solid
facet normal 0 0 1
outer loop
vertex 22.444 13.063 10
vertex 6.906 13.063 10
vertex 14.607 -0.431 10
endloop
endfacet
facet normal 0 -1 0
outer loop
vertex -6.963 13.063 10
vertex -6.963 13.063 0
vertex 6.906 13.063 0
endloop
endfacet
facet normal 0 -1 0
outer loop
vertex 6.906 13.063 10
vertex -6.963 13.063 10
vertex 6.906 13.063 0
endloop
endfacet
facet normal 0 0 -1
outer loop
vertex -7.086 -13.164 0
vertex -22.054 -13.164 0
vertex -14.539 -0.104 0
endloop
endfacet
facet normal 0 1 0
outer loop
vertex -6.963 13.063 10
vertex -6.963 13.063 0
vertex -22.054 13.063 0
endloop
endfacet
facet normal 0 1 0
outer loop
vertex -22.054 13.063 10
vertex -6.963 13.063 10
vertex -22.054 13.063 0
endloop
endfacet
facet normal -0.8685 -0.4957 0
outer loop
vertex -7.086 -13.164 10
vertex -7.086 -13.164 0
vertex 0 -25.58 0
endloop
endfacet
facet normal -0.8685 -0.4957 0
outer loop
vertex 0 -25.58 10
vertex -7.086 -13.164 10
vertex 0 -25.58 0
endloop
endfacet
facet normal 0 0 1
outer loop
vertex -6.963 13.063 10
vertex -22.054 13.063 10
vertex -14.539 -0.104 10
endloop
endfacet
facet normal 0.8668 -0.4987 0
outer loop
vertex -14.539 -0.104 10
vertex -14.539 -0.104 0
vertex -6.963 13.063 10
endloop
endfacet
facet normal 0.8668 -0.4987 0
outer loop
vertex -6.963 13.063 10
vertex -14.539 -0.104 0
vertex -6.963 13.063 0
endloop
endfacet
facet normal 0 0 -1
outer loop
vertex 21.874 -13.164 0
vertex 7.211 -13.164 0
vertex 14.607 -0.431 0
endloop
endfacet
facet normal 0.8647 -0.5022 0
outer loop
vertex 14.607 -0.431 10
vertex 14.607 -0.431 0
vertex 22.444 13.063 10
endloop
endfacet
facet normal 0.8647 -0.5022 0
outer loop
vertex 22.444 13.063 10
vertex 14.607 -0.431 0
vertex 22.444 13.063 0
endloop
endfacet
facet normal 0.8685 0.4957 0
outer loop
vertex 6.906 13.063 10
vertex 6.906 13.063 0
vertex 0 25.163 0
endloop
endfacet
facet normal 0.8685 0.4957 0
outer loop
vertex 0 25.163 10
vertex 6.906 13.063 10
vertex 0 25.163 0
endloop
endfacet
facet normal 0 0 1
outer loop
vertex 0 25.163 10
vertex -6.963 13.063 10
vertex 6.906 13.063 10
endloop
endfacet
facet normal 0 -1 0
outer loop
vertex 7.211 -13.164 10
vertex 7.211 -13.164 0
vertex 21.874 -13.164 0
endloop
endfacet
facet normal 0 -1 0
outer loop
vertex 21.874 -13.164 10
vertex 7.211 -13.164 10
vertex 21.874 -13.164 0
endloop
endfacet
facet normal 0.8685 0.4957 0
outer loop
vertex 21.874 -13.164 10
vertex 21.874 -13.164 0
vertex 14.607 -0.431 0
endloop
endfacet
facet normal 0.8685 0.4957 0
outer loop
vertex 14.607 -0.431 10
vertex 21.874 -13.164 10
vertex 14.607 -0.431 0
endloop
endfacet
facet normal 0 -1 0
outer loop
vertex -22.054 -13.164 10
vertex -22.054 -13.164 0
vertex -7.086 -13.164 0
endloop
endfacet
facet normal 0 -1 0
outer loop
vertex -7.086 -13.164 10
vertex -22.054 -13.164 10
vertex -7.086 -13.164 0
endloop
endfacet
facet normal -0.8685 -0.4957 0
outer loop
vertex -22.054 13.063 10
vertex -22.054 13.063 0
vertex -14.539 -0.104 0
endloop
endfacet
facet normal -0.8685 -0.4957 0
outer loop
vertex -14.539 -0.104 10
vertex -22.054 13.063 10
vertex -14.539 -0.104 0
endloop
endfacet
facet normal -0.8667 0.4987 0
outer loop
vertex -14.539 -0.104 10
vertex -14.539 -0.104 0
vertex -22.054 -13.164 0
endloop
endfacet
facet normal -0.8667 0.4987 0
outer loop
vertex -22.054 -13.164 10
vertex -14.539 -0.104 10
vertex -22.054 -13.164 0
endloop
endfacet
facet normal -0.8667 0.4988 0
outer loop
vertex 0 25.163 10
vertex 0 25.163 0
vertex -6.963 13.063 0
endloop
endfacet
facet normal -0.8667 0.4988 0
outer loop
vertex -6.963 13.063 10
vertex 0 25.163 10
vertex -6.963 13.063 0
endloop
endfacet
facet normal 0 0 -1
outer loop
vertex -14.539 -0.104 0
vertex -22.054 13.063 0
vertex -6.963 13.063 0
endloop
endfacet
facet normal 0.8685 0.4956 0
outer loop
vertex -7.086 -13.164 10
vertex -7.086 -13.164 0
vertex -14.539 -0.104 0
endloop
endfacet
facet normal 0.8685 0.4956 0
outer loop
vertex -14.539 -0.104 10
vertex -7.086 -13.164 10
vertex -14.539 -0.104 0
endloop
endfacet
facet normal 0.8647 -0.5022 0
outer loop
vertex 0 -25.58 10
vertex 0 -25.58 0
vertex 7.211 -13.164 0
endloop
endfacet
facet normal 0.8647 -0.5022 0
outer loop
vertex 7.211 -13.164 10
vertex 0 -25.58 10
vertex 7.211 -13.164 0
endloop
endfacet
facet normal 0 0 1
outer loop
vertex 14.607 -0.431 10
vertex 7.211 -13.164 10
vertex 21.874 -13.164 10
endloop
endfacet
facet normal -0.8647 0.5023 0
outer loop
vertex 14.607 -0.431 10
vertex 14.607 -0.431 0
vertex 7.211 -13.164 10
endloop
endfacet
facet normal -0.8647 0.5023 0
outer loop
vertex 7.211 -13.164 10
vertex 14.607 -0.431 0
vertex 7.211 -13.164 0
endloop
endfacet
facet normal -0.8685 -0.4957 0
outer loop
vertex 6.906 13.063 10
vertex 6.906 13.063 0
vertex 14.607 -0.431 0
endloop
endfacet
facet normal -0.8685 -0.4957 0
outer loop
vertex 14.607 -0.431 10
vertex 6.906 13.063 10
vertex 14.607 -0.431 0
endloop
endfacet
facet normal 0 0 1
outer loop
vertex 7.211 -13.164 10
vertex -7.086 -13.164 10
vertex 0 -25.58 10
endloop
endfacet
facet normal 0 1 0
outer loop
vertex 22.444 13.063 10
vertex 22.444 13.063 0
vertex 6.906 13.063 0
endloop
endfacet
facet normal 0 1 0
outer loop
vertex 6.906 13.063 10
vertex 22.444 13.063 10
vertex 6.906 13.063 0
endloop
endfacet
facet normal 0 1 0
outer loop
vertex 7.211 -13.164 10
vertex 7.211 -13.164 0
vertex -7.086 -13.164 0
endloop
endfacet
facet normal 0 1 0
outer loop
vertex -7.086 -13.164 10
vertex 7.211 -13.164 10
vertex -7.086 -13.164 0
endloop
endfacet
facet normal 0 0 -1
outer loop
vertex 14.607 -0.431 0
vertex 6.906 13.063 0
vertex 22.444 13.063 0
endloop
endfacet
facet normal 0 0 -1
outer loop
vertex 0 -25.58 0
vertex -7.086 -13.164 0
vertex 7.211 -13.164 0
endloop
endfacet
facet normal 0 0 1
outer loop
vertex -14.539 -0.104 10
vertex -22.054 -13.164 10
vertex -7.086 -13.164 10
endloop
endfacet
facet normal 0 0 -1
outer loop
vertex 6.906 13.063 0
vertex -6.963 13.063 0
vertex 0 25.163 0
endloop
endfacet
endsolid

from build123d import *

# Parameters (mm, degrees)
F5_DEPTH = 10


# Not quite as in the source:
# - the program builds the solid bodies; features that only make, move or delete a surface that nothing else refers to are left out


with BuildPart() as f5:
    # F1 (on Top) → F5 (new body)
    with BuildSketch(Plane.XY):
        Polygon((-6.9625685365, 13.063011691), (-22.0539048314, 13.063011691), (-14.5391420015, -0.104448899), align=None)
    extrude(amount=F5_DEPTH)


with BuildPart() as f5b:
    # F1 (on Top) → F5, piece 2 (new body)
    with BuildSketch(Plane.XY):
        Polygon((0, 25.1633822918), (-6.9625685365, 13.063011691), (6.9057670306, 13.063011691), align=None)
    extrude(amount=F5_DEPTH)


with BuildPart() as f5c:
    # F1 (on Top) → F5, piece 3 (new body)
    with BuildSketch(Plane.XY):
        Polygon((22.4442388862, 13.063011691), (6.9057670306, 13.063011691), (14.6068518602, -0.4309246167), align=None)
    extrude(amount=F5_DEPTH)


with BuildPart() as f5d:
    # F1 (on Top) → F5, piece 4 (new body)
    with BuildSketch(Plane.XY):
        Polygon((21.8739863143, -13.1644876968), (14.6068518602, -0.4309246167), (7.2110957366, -13.1644876968), align=None)
    extrude(amount=F5_DEPTH)


with BuildPart() as f5e:
    # F1 (on Top) → F5, piece 5 (new body)
    with BuildSketch(Plane.XY):
        Polygon((7.2110957366, -13.1644876968), (-7.0856855477, -13.1644876968), (0, -25.5801137537), align=None)
    extrude(amount=F5_DEPTH)


with BuildPart() as f5f:
    # F1 (on Top) → F5, piece 6 (new body)
    with BuildSketch(Plane.XY):
        Polygon((-7.0856855477, -13.1644876968), (-14.5391420015, -0.104448899), (-22.0539048314, -13.1644876968), align=None)
    extrude(amount=F5_DEPTH)


solid = Compound([f5.part, f5b.part, f5c.part, f5d.part, f5e.part, f5f.part])
